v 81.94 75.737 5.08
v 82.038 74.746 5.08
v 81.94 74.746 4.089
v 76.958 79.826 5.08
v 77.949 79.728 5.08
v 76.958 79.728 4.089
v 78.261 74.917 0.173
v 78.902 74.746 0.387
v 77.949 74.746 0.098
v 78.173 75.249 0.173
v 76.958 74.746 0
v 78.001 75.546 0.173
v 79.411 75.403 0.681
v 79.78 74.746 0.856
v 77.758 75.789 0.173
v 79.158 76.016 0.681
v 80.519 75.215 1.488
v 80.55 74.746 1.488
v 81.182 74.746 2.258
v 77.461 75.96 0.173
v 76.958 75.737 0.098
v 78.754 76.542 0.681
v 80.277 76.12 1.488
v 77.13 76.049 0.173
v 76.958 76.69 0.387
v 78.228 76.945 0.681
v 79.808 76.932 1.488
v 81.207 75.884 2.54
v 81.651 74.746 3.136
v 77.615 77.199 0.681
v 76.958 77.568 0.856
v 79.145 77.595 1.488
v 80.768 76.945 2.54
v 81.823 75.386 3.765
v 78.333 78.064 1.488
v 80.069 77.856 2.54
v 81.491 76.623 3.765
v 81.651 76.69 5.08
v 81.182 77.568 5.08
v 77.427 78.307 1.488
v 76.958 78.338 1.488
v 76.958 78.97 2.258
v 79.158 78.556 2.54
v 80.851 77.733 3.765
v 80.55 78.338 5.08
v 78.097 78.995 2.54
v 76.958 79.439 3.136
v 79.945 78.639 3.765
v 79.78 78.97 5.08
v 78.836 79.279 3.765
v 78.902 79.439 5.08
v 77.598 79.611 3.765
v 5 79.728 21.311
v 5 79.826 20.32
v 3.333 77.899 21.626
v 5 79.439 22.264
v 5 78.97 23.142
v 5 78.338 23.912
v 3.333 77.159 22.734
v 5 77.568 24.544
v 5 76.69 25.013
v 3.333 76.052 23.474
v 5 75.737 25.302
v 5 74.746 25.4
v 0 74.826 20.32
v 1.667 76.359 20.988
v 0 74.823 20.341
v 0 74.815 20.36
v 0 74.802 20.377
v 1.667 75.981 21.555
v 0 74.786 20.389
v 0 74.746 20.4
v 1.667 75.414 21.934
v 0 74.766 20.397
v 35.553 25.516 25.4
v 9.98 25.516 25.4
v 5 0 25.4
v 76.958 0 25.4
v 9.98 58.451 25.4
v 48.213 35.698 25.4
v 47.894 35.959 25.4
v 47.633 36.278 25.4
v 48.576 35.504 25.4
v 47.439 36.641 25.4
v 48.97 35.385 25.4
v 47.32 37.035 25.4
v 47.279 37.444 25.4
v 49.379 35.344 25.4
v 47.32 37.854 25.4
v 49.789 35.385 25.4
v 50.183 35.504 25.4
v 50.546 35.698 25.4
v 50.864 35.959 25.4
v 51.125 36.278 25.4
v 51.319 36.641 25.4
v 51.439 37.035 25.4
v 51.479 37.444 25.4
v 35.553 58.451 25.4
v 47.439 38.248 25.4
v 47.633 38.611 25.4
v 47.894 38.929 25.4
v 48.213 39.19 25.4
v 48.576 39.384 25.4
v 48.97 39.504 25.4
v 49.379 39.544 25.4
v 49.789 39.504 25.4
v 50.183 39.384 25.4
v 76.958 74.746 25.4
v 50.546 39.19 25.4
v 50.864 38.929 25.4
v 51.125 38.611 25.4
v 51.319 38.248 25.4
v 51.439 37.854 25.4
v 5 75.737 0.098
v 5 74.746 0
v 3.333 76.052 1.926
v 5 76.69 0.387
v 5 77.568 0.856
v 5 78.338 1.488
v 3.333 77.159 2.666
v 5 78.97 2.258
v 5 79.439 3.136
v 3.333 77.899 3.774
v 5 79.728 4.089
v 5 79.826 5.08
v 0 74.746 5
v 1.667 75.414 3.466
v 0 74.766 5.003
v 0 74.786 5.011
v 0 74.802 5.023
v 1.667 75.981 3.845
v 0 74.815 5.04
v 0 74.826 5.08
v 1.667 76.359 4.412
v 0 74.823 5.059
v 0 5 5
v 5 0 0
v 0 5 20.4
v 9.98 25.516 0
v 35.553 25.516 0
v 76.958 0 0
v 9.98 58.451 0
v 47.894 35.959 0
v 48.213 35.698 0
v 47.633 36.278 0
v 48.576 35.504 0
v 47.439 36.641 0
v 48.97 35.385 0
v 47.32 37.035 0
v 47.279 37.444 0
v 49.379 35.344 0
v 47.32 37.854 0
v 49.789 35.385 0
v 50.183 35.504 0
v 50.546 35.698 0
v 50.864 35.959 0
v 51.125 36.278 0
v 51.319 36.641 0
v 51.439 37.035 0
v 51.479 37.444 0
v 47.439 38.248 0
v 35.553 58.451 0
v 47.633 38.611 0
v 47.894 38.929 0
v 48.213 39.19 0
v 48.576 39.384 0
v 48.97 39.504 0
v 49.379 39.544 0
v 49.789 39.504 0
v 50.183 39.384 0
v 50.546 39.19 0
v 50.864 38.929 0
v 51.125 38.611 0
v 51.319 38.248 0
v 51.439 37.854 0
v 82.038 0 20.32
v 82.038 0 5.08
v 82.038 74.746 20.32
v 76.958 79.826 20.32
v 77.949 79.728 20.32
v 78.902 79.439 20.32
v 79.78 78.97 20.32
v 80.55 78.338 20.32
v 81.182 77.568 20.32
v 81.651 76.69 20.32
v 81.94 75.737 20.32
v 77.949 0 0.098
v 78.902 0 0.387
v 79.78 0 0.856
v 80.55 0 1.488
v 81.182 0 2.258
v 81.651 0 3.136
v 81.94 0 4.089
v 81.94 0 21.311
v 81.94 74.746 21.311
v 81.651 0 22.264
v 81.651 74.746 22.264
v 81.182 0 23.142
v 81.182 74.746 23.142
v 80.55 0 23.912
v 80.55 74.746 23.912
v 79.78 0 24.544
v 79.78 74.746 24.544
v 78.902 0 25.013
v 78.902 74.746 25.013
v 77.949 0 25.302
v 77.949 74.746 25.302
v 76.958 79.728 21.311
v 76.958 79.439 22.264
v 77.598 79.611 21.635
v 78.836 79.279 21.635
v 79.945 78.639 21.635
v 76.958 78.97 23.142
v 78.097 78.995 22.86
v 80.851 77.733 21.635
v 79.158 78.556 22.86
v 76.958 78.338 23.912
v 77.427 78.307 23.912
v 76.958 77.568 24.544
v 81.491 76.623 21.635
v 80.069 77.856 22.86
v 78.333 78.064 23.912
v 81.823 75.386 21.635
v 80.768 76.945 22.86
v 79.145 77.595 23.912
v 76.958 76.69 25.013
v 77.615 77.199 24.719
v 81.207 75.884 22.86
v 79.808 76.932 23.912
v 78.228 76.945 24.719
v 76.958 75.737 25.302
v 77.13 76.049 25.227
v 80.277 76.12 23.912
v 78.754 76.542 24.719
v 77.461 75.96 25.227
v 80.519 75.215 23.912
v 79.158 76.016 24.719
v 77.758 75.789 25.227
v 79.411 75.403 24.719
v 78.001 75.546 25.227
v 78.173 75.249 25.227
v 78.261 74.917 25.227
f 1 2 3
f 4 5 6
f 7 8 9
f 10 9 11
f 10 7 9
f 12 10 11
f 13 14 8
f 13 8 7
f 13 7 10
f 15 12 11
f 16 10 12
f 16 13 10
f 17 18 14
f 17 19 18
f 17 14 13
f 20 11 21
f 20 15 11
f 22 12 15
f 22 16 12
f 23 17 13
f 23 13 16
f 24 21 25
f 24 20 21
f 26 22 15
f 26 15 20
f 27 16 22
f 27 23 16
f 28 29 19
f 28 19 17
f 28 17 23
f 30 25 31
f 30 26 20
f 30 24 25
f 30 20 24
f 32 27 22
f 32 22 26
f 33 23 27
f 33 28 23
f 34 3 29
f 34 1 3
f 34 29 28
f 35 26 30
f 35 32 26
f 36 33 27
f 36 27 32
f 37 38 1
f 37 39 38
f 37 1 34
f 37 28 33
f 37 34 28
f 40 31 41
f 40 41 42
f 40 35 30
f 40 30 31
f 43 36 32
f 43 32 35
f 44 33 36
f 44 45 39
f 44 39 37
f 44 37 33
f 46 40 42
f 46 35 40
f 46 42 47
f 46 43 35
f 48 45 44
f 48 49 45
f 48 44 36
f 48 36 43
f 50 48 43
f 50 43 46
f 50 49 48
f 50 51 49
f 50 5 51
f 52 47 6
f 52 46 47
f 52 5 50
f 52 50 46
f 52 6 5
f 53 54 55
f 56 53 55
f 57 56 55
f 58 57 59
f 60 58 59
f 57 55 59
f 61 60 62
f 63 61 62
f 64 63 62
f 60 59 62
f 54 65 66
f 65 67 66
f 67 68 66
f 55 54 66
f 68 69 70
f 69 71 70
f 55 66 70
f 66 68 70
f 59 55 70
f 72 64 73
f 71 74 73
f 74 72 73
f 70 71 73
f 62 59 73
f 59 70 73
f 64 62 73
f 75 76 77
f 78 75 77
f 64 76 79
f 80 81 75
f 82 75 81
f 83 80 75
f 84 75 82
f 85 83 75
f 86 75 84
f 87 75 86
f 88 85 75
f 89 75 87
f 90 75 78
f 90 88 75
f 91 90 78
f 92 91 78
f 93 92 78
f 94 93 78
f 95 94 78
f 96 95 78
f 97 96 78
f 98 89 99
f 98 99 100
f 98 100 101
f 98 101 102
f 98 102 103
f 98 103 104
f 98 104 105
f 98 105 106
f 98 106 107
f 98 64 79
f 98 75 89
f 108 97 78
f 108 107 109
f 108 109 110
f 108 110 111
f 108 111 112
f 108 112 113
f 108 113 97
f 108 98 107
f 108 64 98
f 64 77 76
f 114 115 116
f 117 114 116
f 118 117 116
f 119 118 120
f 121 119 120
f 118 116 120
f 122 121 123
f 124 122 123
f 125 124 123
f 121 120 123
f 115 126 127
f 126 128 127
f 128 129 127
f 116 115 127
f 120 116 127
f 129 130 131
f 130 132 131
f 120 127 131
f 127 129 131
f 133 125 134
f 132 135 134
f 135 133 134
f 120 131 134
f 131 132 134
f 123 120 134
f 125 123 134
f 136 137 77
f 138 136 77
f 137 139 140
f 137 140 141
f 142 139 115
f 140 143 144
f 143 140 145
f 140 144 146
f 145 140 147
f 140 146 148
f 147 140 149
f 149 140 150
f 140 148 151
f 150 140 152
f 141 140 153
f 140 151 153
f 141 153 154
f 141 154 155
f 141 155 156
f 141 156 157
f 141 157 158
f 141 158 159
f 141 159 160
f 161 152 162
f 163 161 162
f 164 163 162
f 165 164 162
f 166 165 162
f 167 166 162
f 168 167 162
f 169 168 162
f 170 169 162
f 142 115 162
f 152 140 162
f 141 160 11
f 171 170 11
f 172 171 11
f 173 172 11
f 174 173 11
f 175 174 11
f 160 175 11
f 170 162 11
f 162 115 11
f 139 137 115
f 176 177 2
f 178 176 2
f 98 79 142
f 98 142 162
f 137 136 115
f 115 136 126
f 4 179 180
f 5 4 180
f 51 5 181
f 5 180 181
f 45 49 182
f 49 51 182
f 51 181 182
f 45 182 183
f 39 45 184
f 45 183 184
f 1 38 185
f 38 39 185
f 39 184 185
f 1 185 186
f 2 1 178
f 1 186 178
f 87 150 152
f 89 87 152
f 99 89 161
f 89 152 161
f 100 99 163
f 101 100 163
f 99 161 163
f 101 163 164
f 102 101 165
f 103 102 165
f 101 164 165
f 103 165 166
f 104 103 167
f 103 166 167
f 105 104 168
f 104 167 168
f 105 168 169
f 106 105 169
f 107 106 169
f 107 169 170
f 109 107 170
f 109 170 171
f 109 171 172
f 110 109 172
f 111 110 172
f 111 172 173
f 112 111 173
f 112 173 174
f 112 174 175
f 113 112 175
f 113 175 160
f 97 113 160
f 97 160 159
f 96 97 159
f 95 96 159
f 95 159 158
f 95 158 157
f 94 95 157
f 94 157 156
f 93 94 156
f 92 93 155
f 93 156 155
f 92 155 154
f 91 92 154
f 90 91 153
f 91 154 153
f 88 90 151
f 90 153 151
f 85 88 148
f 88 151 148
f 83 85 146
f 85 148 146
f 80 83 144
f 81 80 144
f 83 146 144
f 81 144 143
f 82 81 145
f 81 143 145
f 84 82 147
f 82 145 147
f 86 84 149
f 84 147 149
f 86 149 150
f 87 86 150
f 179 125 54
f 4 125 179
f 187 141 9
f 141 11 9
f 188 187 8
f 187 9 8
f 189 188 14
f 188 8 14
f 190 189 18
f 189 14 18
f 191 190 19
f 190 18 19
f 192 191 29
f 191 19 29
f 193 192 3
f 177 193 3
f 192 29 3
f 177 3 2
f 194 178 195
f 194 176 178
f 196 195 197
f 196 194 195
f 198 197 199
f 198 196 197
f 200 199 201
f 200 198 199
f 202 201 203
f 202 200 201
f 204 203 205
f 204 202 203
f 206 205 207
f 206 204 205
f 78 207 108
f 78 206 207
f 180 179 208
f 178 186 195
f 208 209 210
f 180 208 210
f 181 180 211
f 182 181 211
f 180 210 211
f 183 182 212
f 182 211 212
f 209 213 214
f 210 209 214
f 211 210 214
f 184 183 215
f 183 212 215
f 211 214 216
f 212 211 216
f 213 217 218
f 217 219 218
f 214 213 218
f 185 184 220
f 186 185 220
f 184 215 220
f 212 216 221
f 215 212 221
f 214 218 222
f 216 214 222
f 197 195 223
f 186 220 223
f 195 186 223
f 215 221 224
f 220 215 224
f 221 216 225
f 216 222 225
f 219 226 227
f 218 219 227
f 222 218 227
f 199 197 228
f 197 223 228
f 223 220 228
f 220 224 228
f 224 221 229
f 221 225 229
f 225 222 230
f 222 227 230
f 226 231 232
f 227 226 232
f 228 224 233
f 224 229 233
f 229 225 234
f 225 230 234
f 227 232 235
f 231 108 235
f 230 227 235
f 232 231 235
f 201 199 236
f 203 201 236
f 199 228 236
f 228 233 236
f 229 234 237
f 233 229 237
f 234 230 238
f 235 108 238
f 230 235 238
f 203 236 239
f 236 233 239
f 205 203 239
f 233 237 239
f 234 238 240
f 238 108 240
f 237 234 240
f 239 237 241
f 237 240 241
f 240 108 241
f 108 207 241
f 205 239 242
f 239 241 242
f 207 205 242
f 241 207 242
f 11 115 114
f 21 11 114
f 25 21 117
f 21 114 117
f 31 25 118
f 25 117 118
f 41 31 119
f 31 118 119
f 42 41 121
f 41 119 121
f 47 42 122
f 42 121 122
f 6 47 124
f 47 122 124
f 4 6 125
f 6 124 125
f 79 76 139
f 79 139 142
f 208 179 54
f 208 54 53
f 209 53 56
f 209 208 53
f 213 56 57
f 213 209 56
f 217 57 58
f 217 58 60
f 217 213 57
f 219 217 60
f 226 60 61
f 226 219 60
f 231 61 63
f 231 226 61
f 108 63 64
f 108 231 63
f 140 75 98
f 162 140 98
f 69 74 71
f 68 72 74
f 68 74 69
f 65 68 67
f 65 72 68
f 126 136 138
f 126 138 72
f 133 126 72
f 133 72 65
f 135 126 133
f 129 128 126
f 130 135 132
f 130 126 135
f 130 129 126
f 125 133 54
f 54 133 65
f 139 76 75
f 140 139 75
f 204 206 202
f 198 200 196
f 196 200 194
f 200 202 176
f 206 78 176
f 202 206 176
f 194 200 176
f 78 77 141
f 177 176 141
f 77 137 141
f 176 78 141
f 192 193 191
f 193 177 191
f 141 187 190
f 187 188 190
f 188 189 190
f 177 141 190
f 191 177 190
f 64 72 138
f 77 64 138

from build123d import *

# Parameters (mm, degrees)
F0_W     = 82.0379033685
F0_H     = 79.8256471753
F1_DEPTH = 25.4
F3_D     = 4.2
F4_R     = 5.08
F5_R     = 5.08
F6_R     = 5.08
F7_W     = 25.5733272061
F7_H     = 32.9347681254
F8_DEPTH = 25.4
F9_SIZE  = 5


with BuildPart() as f1:
    # F0 (on Top) → F1 (new body)
    with BuildSketch(Plane.XY):
        with Locations((41.0189516842, 39.9128235877)):
            Rectangle(F0_W, F0_H)
    extrude(amount=F1_DEPTH)

    # F3 (through all)
    with Locations(Plane.XY.offset(25.4)):
        with Locations((49.3793413043, 37.4442487955)):
            Hole(F3_D / 2)

    # F4
    f4_edges = [f1.edges().sort_by_distance(p)[0] for p in [
        (82.037903, 79.825647, 12.7),
    ]]
    fillet(f4_edges, radius=F4_R)

    # F5
    f5_edges = [f1.edges().sort_by_distance(p)[0] for p in [
        (82.037903, 37.372824, 0),
    ]]
    fillet(f5_edges, radius=F5_R)

    # F6
    f6_edges = [f1.edges().sort_by_distance(p)[0] for p in [
        (38.478952, 79.825647, 25.4),
    ]]
    fillet(f6_edges, radius=F6_R)

    # F7 (on face) → F8 (cut)
    with BuildSketch(Plane.XY.offset(25.4)):
        with Locations((22.7667321451, 41.983817704)):
            Rectangle(F7_W, F7_H)
    extrude(amount=-F8_DEPTH, mode=Mode.SUBTRACT)

    # F9
    f9_edges = [f1.edges().sort_by_distance(p)[0] for p in [
        (0, 79.825647, 12.7),
        (0, 78.33775, 23.912102),
        (0, 78.33775, 1.487898),
        (0, 37.372824, 25.4),
        (0, 37.372824, 0),
        (0, 0, 12.7),
    ]]
    chamfer(f9_edges, length=F9_SIZE)


solid = f1.part
